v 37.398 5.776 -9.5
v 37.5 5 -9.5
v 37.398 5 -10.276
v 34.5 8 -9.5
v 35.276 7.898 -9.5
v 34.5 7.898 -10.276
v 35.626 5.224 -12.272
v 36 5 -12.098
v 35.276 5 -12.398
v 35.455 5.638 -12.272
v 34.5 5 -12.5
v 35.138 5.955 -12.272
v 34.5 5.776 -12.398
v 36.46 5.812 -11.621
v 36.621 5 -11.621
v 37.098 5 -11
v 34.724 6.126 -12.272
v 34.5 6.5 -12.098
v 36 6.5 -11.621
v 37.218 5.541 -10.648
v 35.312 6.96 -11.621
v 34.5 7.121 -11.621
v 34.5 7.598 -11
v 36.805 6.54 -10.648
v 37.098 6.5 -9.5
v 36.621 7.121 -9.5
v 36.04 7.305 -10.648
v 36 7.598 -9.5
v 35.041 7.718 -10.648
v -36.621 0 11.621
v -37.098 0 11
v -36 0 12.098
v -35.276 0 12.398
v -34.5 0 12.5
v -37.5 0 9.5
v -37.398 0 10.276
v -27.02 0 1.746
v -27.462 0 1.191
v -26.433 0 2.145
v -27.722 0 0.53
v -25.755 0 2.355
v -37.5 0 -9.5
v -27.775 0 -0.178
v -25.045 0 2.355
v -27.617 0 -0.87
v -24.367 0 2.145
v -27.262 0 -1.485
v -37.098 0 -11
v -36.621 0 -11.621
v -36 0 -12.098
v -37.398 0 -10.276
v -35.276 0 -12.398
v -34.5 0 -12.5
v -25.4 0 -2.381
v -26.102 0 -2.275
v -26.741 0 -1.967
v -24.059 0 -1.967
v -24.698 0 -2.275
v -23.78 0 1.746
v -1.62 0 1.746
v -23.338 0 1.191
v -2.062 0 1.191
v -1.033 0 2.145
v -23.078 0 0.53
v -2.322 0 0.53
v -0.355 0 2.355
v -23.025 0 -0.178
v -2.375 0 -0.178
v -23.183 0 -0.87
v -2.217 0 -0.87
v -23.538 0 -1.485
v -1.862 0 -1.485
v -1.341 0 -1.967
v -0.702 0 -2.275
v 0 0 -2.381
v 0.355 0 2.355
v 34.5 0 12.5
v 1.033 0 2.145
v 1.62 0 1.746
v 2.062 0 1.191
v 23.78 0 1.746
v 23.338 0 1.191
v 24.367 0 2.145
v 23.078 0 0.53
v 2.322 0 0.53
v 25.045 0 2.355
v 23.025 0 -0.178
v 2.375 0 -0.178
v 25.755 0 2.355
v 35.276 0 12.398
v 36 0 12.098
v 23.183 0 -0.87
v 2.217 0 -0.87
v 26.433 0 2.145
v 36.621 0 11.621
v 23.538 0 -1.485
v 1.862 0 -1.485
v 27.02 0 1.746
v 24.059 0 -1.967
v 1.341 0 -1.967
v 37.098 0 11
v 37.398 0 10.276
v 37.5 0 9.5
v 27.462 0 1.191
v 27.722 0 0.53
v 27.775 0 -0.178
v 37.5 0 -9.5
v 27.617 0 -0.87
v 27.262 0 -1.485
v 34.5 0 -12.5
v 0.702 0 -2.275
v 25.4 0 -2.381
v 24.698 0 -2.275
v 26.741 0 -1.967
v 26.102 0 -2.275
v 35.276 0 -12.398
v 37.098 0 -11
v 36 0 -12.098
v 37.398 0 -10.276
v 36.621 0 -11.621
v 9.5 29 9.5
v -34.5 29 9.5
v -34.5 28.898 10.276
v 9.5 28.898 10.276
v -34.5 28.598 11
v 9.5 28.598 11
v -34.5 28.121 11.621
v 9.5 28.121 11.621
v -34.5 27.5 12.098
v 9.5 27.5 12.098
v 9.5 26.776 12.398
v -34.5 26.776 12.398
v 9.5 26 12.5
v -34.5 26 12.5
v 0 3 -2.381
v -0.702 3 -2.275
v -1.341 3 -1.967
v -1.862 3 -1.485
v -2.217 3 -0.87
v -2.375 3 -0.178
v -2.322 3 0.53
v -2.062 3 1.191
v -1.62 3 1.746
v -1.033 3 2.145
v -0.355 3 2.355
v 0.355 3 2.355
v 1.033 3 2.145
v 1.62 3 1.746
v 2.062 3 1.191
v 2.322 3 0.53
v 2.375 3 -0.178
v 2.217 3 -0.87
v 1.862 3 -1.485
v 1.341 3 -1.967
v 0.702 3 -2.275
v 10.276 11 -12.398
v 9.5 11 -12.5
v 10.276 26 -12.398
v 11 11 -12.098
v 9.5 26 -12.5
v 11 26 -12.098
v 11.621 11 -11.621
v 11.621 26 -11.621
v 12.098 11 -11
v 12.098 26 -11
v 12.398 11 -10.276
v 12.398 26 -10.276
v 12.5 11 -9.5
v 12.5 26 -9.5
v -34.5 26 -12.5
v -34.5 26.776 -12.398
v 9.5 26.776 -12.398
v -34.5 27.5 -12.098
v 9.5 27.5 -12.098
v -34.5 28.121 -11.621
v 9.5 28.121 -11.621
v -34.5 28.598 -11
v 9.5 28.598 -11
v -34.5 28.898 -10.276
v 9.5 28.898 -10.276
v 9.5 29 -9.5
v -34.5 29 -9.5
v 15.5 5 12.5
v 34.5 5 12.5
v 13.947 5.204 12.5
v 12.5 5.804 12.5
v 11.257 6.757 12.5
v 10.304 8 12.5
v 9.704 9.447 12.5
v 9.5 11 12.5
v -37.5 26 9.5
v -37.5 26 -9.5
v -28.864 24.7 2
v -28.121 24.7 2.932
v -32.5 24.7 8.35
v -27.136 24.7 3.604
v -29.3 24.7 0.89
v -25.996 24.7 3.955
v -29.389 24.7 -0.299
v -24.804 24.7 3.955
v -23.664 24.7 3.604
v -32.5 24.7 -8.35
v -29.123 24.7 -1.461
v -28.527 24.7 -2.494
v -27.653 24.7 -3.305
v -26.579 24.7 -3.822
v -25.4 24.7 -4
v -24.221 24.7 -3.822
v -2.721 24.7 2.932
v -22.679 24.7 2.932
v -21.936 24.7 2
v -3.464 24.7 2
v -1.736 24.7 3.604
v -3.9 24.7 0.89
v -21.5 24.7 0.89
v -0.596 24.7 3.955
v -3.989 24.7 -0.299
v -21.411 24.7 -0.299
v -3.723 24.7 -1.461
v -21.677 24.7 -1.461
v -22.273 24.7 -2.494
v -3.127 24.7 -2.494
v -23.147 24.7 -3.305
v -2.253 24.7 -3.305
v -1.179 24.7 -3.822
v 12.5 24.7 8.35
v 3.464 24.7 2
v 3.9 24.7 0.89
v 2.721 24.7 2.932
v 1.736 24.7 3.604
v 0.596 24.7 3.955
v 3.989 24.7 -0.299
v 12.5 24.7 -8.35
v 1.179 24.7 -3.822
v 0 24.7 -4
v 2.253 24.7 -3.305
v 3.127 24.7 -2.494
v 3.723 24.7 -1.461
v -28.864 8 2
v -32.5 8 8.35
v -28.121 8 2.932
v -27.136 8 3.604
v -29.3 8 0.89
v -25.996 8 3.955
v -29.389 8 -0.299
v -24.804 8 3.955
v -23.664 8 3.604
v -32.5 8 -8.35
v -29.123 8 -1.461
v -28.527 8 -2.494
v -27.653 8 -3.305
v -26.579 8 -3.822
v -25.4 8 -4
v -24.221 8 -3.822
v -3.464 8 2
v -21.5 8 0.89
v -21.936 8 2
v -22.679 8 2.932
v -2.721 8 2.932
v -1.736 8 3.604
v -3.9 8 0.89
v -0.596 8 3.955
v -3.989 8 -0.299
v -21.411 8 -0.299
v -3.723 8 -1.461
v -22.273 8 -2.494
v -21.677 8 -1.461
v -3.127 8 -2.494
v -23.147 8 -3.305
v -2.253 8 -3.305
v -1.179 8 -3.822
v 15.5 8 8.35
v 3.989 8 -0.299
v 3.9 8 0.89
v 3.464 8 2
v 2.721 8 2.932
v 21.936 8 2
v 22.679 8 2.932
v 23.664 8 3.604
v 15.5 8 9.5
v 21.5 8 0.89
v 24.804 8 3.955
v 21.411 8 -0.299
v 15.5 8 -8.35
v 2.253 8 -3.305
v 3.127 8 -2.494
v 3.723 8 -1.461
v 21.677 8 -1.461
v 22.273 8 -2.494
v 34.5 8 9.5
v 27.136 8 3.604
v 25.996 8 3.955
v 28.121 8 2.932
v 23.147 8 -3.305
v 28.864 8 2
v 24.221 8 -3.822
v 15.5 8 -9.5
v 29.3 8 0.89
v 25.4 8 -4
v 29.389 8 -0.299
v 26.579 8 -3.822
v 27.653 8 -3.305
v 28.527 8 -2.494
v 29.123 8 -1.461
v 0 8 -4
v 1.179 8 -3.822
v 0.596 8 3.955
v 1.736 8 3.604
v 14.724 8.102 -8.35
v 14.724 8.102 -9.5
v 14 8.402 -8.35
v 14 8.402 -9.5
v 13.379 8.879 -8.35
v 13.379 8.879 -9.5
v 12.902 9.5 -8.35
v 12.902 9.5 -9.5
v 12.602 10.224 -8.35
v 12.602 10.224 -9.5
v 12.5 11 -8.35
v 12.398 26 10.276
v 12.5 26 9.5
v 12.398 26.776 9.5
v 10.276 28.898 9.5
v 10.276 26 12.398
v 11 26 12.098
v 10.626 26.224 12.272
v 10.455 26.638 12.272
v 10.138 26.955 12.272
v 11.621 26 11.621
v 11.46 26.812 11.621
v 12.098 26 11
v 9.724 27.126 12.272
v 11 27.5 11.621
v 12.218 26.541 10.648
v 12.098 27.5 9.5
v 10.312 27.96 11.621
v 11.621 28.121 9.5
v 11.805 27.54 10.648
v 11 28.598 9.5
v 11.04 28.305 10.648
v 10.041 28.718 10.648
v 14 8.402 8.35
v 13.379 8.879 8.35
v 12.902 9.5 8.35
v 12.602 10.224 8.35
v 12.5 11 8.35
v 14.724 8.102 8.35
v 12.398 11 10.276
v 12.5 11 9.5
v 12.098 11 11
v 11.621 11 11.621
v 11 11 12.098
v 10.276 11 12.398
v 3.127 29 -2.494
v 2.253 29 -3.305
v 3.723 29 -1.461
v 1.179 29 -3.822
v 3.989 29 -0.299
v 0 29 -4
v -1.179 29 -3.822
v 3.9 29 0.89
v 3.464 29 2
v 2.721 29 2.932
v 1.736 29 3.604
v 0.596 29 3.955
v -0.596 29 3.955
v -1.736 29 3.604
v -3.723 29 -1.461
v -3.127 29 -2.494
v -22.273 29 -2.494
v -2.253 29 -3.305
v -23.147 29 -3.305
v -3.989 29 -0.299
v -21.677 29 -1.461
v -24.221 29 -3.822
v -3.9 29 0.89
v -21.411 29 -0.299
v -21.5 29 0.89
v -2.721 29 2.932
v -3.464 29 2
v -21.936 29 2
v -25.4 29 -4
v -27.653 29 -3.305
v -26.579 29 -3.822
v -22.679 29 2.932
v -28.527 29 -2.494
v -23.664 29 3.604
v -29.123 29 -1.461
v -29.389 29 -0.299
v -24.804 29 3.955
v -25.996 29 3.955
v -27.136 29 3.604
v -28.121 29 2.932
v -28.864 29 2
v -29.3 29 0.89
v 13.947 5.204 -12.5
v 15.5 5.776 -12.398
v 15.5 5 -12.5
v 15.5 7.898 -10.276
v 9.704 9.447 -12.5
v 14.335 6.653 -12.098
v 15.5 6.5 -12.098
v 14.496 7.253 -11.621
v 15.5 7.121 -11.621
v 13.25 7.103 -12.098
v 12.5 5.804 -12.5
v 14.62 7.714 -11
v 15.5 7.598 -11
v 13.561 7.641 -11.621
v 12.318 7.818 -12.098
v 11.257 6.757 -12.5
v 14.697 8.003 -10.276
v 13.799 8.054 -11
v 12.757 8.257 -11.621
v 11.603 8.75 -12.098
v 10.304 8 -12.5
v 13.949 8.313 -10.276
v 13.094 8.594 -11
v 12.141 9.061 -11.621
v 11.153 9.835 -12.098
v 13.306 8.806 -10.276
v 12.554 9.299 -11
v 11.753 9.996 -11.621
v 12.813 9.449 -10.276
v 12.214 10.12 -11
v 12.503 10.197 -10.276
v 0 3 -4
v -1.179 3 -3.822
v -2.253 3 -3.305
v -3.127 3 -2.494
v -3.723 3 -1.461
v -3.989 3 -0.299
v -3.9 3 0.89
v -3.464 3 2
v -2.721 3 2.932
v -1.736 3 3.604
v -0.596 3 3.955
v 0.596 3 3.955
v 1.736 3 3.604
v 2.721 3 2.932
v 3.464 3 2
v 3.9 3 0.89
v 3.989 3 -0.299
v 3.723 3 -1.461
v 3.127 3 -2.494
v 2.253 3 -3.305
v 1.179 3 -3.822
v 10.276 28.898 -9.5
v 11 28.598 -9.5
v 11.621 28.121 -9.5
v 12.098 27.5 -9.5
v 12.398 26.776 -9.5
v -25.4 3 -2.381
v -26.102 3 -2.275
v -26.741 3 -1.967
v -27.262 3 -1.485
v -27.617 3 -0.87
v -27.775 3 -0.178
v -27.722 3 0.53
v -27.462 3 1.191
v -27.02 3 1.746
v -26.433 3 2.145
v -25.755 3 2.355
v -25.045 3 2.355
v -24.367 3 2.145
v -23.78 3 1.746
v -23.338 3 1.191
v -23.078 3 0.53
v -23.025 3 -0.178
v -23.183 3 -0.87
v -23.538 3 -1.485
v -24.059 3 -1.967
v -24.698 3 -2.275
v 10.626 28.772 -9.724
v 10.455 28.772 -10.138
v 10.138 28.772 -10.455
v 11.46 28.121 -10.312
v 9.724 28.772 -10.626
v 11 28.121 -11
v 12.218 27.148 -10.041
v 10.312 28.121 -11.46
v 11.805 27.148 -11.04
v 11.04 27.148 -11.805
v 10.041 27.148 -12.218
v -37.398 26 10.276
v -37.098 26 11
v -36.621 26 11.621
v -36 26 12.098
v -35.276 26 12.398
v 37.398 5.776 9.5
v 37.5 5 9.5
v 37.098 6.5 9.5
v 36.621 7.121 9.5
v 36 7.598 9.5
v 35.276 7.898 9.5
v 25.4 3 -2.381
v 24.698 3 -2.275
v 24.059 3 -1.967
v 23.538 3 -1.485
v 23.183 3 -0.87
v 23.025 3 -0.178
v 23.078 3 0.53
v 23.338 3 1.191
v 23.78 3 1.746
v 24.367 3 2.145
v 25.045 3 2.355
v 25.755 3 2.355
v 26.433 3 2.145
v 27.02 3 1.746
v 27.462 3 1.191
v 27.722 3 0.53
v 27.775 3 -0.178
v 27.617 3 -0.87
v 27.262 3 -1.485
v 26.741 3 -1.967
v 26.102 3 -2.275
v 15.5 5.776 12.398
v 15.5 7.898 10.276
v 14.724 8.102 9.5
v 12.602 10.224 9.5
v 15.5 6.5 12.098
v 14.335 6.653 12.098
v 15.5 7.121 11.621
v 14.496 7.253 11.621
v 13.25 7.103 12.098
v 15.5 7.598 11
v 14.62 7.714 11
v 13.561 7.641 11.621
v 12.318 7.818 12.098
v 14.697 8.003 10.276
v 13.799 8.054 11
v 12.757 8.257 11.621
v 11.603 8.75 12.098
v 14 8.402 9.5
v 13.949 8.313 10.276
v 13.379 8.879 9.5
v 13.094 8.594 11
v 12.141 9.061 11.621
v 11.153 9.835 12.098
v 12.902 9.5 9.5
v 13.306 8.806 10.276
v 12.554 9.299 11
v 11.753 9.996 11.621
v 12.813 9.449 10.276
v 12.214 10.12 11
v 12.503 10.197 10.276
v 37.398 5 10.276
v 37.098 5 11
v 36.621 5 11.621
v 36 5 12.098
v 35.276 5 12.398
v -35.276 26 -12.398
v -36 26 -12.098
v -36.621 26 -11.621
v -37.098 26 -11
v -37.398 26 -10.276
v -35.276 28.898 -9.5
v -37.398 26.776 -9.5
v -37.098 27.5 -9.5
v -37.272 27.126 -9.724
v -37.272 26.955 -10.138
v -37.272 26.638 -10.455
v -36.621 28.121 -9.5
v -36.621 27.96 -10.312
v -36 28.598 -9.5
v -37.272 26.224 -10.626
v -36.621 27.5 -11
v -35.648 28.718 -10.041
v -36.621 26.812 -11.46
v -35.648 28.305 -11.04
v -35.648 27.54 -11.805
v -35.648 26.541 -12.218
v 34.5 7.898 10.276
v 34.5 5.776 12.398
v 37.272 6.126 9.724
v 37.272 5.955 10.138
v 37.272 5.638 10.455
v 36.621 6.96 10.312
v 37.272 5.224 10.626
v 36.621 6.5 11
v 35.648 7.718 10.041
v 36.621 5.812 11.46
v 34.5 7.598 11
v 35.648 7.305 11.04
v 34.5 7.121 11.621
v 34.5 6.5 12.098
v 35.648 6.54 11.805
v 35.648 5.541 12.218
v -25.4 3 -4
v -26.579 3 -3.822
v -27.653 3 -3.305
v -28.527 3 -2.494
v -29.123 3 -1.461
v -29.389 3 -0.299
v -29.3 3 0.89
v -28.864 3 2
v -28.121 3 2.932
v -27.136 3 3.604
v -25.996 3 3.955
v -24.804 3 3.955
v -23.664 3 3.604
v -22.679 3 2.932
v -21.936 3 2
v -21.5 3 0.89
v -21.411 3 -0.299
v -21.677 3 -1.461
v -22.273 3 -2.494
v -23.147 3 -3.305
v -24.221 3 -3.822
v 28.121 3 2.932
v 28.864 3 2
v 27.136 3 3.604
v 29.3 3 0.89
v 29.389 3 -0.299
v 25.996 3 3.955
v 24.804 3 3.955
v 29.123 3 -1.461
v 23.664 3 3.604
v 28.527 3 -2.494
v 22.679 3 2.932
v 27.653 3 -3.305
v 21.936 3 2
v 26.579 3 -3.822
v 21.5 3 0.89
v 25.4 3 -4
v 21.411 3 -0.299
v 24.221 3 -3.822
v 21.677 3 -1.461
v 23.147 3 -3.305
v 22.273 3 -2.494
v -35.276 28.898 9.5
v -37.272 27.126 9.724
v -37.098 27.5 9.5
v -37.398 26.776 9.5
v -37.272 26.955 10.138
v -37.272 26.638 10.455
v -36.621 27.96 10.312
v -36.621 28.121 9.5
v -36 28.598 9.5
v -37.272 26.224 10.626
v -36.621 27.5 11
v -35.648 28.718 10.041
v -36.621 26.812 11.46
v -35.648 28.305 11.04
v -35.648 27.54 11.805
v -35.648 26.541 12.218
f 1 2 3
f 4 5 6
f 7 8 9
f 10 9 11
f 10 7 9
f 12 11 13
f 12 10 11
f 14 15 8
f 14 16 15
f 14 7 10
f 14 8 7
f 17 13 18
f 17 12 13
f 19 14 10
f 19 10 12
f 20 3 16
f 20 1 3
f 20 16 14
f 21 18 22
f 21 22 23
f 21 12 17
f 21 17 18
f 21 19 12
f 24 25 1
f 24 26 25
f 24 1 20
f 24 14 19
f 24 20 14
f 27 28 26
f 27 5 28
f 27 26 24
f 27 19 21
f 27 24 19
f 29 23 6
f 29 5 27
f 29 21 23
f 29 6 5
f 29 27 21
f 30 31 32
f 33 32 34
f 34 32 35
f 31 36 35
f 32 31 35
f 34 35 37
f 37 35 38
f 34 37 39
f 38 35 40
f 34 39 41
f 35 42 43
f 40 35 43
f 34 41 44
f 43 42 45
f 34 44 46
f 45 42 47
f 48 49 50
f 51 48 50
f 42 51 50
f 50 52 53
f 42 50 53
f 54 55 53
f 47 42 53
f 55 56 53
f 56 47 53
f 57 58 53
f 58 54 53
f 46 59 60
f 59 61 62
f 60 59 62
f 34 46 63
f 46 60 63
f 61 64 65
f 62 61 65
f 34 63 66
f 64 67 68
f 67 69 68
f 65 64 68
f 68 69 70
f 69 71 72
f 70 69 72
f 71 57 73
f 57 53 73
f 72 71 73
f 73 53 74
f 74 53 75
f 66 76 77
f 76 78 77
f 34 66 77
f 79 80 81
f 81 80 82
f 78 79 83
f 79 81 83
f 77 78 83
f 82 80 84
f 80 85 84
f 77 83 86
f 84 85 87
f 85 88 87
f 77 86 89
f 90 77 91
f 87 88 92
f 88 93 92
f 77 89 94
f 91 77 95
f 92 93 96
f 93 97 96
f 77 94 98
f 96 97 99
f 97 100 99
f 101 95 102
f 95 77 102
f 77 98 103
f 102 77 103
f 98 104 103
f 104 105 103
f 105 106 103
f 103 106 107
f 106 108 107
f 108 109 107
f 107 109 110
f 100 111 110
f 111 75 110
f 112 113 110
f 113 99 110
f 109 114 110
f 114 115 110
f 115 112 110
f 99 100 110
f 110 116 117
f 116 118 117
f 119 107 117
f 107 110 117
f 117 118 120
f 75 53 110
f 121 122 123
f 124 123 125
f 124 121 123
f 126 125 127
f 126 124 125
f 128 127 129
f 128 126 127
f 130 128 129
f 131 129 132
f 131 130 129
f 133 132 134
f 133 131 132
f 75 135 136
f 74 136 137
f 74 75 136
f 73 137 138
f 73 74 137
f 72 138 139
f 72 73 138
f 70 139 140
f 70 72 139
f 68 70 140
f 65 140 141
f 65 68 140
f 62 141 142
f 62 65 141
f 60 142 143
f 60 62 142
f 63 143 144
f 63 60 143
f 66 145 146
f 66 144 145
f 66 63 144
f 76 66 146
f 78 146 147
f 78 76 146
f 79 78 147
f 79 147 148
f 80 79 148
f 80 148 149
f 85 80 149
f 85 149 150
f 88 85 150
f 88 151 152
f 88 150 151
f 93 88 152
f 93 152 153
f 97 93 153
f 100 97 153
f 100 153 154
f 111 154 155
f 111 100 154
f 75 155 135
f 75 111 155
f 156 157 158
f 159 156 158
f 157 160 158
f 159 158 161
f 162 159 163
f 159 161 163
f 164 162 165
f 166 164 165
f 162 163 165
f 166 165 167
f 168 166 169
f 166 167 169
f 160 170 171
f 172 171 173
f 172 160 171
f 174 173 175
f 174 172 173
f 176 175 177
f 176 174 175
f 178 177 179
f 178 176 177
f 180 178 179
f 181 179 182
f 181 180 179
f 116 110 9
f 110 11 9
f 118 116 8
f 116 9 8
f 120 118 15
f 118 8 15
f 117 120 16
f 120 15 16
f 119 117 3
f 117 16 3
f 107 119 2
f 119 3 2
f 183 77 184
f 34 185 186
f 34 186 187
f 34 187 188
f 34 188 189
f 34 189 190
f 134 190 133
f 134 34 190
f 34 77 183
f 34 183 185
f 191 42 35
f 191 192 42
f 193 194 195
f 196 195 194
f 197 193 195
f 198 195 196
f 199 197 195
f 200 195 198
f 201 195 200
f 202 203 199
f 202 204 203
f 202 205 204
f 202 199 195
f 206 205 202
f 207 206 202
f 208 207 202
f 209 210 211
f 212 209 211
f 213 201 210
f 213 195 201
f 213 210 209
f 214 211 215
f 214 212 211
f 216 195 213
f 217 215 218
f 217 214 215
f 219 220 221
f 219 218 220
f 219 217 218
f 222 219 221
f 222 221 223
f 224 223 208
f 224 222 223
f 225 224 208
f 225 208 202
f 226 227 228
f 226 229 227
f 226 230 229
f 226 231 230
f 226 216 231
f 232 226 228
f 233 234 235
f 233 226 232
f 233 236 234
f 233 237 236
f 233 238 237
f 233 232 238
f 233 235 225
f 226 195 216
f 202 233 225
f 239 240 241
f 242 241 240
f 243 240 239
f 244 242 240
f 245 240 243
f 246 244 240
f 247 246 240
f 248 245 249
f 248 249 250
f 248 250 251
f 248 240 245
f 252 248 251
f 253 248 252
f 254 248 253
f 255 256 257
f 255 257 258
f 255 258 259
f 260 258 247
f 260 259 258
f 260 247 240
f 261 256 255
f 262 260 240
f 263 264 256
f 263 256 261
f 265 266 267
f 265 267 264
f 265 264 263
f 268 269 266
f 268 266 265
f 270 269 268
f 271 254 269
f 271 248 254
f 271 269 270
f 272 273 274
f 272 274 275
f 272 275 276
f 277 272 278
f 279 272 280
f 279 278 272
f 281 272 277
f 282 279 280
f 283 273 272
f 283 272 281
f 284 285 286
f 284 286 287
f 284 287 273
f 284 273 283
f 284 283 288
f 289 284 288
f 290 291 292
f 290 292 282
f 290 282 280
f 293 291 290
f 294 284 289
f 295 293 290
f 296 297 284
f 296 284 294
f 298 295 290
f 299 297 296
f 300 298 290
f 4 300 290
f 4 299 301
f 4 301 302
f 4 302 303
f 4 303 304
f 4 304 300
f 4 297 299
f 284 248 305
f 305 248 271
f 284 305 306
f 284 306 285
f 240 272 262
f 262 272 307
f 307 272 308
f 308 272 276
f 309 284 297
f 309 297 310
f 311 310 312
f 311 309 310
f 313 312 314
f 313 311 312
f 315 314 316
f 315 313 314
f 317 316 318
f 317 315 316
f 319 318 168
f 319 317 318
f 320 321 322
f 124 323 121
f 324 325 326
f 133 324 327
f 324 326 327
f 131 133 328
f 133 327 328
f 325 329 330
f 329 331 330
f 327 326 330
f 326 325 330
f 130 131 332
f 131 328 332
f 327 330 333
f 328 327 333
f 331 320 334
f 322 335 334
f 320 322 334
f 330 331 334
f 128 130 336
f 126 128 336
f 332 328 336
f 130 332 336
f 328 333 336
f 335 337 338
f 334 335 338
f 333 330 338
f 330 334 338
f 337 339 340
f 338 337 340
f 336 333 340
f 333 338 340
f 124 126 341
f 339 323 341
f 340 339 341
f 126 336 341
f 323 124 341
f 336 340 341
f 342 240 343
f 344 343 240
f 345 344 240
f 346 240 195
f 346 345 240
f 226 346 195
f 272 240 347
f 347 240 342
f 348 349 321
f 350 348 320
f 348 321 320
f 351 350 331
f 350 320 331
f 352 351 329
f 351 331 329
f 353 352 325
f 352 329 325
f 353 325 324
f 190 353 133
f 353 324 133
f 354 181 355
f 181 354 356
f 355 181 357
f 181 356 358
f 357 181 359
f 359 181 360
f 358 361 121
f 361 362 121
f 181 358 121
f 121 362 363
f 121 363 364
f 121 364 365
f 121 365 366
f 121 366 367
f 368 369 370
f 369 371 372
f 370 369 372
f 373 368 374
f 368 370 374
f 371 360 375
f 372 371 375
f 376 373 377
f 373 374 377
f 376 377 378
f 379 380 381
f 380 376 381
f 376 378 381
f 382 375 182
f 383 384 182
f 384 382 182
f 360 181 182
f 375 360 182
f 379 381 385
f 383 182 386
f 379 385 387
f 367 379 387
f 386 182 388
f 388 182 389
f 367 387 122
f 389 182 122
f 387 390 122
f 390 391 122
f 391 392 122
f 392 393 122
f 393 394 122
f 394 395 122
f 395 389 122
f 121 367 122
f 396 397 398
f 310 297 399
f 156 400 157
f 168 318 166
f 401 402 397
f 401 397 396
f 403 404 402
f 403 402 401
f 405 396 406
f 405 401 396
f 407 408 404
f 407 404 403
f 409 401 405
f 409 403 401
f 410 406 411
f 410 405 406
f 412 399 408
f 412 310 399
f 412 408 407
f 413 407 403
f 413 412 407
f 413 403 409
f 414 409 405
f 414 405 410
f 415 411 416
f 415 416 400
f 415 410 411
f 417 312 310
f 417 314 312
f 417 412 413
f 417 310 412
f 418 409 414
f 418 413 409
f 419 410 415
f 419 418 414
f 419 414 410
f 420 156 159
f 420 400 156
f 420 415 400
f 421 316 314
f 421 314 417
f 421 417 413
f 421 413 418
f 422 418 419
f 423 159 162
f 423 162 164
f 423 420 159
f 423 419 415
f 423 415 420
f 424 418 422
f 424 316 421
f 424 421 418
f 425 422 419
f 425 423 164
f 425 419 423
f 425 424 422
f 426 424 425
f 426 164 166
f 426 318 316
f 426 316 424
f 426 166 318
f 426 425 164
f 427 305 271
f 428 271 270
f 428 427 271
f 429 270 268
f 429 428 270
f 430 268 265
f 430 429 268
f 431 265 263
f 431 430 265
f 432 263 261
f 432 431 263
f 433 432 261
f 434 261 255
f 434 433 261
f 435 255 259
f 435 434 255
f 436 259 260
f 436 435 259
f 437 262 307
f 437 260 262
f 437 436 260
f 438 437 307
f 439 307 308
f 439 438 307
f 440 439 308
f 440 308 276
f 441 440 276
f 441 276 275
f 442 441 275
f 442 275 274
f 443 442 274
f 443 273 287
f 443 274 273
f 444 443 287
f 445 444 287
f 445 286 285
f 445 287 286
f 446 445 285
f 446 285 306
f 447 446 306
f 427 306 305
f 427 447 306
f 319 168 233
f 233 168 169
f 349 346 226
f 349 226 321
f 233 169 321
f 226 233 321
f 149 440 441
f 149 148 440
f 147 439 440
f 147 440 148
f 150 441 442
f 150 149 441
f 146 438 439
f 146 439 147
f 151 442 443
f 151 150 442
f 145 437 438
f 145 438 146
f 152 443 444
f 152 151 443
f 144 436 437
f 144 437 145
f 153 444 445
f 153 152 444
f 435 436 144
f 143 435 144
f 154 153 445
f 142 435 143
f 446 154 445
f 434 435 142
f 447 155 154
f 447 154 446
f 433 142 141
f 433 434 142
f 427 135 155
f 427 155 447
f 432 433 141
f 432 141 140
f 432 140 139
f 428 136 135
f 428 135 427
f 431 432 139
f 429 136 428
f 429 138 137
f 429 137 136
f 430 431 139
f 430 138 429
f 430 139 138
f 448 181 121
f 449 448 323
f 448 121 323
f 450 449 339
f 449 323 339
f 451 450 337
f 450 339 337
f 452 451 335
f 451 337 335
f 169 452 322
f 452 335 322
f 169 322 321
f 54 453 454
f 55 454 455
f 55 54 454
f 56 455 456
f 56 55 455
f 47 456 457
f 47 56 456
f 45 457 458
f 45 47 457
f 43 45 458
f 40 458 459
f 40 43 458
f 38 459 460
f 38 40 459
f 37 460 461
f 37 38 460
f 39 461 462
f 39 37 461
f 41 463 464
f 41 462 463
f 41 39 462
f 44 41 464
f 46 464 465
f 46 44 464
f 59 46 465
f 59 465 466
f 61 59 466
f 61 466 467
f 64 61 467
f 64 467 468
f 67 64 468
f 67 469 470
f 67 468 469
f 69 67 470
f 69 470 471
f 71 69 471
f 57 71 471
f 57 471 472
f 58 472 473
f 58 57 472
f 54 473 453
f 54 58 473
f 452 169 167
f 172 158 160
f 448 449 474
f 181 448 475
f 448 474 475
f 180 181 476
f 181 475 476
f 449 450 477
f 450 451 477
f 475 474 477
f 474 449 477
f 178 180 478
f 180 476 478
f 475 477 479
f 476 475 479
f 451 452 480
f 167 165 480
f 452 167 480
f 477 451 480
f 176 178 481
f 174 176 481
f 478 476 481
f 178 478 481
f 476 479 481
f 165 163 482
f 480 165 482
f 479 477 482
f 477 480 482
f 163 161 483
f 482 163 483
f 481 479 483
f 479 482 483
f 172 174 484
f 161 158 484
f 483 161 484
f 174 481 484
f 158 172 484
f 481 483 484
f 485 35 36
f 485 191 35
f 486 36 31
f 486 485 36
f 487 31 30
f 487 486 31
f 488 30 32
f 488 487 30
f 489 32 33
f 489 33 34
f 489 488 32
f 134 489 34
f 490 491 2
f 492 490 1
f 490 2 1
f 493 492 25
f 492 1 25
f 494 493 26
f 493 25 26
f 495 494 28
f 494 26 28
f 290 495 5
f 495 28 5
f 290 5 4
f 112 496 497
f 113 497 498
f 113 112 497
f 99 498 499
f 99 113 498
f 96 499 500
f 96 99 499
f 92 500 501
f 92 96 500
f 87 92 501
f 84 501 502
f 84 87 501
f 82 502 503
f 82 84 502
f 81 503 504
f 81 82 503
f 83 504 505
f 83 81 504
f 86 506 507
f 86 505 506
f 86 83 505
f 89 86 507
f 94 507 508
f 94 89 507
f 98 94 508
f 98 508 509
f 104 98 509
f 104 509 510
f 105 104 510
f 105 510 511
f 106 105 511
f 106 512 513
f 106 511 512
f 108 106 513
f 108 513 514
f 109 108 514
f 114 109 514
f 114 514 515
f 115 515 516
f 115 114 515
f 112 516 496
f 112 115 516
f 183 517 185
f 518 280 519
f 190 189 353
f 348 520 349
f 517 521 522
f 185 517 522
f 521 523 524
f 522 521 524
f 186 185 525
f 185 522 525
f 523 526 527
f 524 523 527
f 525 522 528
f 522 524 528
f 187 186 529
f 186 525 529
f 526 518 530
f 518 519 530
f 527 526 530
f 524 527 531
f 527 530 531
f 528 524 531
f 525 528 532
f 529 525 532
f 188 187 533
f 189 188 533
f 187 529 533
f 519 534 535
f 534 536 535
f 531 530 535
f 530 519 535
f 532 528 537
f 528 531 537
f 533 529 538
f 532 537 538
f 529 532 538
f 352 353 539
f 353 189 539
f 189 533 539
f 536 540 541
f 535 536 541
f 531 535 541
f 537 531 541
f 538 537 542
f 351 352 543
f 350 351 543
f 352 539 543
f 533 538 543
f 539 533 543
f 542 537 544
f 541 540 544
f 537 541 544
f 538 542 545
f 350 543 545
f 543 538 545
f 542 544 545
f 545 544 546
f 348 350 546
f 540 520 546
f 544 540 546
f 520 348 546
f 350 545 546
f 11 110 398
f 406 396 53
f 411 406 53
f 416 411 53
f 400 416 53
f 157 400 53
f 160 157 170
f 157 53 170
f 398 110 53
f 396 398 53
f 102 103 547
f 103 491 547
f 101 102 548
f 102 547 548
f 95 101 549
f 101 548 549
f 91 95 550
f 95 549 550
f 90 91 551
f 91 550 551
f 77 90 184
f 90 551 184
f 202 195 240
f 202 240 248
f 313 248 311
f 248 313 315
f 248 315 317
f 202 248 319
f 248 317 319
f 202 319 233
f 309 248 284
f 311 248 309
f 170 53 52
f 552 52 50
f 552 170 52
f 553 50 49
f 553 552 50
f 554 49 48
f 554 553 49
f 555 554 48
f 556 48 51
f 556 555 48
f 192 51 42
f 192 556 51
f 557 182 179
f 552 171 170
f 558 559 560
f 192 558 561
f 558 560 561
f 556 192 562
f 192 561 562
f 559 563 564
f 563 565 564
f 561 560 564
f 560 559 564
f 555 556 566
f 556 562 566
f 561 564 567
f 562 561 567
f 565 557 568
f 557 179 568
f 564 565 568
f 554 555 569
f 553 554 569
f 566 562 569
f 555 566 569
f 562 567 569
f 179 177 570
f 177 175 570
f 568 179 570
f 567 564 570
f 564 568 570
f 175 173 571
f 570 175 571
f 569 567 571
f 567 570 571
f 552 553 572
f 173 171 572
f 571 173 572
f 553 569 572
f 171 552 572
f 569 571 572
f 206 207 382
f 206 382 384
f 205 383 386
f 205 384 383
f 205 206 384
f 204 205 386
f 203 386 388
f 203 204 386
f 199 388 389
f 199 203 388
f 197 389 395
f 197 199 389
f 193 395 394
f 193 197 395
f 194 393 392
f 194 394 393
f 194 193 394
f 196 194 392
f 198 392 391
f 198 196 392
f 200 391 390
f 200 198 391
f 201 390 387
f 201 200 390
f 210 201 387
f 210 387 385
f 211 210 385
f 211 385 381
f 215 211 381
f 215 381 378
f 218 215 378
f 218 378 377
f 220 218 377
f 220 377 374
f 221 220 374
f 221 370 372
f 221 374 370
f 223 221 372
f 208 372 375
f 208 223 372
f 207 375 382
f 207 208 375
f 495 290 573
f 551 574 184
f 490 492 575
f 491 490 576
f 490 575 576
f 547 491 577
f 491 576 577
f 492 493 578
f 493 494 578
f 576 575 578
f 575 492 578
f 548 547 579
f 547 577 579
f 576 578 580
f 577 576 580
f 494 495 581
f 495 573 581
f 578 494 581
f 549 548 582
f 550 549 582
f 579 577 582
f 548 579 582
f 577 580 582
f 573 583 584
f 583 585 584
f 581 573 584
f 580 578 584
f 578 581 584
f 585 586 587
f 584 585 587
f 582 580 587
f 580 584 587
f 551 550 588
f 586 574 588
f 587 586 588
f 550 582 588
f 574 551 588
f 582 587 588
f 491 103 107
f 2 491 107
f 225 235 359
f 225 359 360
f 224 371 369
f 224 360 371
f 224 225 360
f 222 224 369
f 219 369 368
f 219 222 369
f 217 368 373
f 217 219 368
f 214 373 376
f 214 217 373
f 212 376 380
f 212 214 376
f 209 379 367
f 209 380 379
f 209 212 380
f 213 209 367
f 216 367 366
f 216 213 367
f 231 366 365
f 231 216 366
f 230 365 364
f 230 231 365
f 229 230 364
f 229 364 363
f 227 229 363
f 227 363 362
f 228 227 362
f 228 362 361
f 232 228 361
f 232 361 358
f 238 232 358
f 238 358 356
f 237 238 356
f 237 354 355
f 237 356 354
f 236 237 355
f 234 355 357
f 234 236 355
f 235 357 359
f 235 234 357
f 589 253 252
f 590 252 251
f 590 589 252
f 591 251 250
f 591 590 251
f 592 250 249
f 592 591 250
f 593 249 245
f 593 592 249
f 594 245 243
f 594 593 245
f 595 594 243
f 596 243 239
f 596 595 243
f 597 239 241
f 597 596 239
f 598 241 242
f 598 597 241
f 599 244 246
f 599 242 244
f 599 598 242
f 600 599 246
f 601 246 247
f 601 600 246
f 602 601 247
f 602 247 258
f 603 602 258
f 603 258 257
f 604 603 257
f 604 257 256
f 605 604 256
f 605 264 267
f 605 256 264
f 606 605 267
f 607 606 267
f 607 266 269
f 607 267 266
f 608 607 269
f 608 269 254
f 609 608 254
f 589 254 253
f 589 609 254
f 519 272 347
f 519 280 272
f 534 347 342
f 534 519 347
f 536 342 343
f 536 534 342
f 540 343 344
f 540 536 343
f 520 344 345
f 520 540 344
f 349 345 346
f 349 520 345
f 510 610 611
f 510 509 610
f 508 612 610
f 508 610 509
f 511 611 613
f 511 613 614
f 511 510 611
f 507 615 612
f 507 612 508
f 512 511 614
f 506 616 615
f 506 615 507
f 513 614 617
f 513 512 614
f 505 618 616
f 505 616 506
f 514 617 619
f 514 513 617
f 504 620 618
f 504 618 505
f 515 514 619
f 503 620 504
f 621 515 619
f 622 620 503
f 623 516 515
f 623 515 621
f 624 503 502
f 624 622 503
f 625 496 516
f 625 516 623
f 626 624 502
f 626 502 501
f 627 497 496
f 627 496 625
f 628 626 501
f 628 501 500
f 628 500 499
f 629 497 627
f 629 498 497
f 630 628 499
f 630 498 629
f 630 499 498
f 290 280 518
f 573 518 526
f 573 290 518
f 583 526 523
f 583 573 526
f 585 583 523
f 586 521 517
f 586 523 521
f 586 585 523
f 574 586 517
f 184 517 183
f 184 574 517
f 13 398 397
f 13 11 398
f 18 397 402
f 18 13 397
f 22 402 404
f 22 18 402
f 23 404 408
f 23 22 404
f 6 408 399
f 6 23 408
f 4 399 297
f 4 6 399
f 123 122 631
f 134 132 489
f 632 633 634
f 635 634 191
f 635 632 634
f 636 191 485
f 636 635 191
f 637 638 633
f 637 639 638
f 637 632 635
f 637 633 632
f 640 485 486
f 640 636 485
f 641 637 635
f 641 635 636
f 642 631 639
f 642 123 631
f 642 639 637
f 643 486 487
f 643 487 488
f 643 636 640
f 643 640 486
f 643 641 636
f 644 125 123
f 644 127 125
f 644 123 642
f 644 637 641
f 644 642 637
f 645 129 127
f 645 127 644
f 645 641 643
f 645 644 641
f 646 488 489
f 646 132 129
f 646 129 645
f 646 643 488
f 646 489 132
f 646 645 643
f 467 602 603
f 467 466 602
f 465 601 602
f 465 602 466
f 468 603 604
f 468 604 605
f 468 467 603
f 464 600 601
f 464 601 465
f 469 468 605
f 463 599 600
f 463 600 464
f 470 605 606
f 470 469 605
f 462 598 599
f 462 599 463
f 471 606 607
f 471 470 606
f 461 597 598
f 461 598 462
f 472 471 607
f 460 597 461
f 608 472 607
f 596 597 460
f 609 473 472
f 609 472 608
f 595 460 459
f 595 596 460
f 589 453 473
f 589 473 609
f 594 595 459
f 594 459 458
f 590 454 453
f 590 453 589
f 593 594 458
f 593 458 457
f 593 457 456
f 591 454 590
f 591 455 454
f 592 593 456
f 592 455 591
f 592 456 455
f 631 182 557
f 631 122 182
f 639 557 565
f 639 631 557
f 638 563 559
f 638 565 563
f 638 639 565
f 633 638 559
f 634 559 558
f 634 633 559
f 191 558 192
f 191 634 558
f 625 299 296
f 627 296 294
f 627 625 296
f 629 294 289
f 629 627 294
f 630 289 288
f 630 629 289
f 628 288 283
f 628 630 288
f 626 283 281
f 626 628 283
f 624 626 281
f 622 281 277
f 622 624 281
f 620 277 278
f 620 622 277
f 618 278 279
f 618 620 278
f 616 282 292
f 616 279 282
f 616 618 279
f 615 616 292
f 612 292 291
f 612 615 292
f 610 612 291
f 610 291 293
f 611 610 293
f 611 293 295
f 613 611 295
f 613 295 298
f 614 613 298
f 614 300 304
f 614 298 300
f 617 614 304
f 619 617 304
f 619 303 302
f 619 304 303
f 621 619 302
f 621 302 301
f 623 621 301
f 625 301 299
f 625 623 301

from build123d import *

# Parameters (mm, degrees)
SKETCH1_W               = 75
SKETCH1_H               = 25
BOSS_EXTRUDE1_DEPTH     = 8
SKETCH5_W               = 25
SKETCH5_H               = 21
BOSS_EXTRUDE2_DEPTH     = 50
SKETCH7_W               = 16.7
SKETCH7_H               = 16.7
CUT_EXTRUDE3_DEPTH      = 45
SKETCH4_R               = 2.38125
CUT_EXTRUDE2_DEPTH      = 50.025503567
CUT_EXTRUDE1_DEPTH      = 45.760473635
CUT_EXTRUDE1_DEPTH_BACK = 5
SKETCH3_R               = 4
FILLET1_R               = 3


with BuildPart() as part:
    # Sketch1 → Boss-Extrude1 (new body)
    with BuildSketch(Plane(origin=(0, 0, 0), x_dir=(1, 0, 0), z_dir=(0, 1, 0))):
        Rectangle(SKETCH1_W, SKETCH1_H)
    extrude(amount=BOSS_EXTRUDE1_DEPTH)

    # Sketch5 → Boss-Extrude2 (add)
    with BuildSketch(Plane.ZY.offset(37.5)):
        with Locations((0, 18.5)):
            Rectangle(SKETCH5_W, SKETCH5_H)
    extrude(amount=-BOSS_EXTRUDE2_DEPTH)

    # Sketch7 → Cut-Extrude3 (cut)
    with BuildSketch(Plane(origin=(12.5, 0, 0), x_dir=(0, 0, -1), z_dir=(1, 0, 0))):
        with Locations((0, 16.35)):
            Rectangle(SKETCH7_W, SKETCH7_H)
    extrude(amount=-CUT_EXTRUDE3_DEPTH, mode=Mode.SUBTRACT)

    # Sketch4 → Cut-Extrude2 (cut, through all)
    with BuildSketch(Plane(origin=(0, 0, 0), x_dir=(1, 0, 0), z_dir=(0, 1, 0))):
        with Locations(Location((0, 0, 0), (0, 0, 90))):
            Circle(SKETCH4_R)
        with Locations(Location((25.4, 0, 0), (0, 0, 90))):
            Circle(SKETCH4_R)
        with Locations(Location((-25.4, 0, 0), (0, 0, 90))):
            Circle(SKETCH4_R)
    extrude(amount=CUT_EXTRUDE2_DEPTH, mode=Mode.SUBTRACT)

    # Sketch3 → Cut-Extrude1 (cut, two sides: drawn at the far end of the back side and taken through both)
    with BuildSketch(Plane(origin=(0, 8, 0), x_dir=(1, 0, 0), z_dir=(0, 1, 0)).offset(-CUT_EXTRUDE1_DEPTH_BACK)):
        with Locations(Location((0, 0, 0), (0, 0, 90))):
            Circle(SKETCH3_R)
        with Locations(Location((25.4, 0, 0), (0, 0, 90))):
            Circle(SKETCH3_R)
        with Locations(Location((-25.4, 0, 0), (0, 0, 90))):
            Circle(SKETCH3_R)
    extrude(amount=CUT_EXTRUDE1_DEPTH + CUT_EXTRUDE1_DEPTH_BACK, mode=Mode.SUBTRACT)

    # Fillet1
    fillet1_edges = [part.edges().sort_by_distance(p)[0] for p in [
        (25, 8, 12.5),
        (12.5, 18.5, -12.5),
        (12.5, 29, 0),
        (-12.5, 29, -12.5),
        (12.5, 18.5, 12.5),
        (-12.5, 29, 12.5),
        (12.5, 8, -10.425),
        (-37.5, 29, 0),
        (12.5, 8, 10.425),
        (37.5, 8, 0),
        (37.5, 4, 12.5),
        (-37.5, 14.5, 12.5),
        (-37.5, 14.5, -12.5),
        (37.5, 4, -12.5),
        (25, 8, -12.5),
    ]]
    fillet(fillet1_edges, radius=FILLET1_R)


solid = part.part
